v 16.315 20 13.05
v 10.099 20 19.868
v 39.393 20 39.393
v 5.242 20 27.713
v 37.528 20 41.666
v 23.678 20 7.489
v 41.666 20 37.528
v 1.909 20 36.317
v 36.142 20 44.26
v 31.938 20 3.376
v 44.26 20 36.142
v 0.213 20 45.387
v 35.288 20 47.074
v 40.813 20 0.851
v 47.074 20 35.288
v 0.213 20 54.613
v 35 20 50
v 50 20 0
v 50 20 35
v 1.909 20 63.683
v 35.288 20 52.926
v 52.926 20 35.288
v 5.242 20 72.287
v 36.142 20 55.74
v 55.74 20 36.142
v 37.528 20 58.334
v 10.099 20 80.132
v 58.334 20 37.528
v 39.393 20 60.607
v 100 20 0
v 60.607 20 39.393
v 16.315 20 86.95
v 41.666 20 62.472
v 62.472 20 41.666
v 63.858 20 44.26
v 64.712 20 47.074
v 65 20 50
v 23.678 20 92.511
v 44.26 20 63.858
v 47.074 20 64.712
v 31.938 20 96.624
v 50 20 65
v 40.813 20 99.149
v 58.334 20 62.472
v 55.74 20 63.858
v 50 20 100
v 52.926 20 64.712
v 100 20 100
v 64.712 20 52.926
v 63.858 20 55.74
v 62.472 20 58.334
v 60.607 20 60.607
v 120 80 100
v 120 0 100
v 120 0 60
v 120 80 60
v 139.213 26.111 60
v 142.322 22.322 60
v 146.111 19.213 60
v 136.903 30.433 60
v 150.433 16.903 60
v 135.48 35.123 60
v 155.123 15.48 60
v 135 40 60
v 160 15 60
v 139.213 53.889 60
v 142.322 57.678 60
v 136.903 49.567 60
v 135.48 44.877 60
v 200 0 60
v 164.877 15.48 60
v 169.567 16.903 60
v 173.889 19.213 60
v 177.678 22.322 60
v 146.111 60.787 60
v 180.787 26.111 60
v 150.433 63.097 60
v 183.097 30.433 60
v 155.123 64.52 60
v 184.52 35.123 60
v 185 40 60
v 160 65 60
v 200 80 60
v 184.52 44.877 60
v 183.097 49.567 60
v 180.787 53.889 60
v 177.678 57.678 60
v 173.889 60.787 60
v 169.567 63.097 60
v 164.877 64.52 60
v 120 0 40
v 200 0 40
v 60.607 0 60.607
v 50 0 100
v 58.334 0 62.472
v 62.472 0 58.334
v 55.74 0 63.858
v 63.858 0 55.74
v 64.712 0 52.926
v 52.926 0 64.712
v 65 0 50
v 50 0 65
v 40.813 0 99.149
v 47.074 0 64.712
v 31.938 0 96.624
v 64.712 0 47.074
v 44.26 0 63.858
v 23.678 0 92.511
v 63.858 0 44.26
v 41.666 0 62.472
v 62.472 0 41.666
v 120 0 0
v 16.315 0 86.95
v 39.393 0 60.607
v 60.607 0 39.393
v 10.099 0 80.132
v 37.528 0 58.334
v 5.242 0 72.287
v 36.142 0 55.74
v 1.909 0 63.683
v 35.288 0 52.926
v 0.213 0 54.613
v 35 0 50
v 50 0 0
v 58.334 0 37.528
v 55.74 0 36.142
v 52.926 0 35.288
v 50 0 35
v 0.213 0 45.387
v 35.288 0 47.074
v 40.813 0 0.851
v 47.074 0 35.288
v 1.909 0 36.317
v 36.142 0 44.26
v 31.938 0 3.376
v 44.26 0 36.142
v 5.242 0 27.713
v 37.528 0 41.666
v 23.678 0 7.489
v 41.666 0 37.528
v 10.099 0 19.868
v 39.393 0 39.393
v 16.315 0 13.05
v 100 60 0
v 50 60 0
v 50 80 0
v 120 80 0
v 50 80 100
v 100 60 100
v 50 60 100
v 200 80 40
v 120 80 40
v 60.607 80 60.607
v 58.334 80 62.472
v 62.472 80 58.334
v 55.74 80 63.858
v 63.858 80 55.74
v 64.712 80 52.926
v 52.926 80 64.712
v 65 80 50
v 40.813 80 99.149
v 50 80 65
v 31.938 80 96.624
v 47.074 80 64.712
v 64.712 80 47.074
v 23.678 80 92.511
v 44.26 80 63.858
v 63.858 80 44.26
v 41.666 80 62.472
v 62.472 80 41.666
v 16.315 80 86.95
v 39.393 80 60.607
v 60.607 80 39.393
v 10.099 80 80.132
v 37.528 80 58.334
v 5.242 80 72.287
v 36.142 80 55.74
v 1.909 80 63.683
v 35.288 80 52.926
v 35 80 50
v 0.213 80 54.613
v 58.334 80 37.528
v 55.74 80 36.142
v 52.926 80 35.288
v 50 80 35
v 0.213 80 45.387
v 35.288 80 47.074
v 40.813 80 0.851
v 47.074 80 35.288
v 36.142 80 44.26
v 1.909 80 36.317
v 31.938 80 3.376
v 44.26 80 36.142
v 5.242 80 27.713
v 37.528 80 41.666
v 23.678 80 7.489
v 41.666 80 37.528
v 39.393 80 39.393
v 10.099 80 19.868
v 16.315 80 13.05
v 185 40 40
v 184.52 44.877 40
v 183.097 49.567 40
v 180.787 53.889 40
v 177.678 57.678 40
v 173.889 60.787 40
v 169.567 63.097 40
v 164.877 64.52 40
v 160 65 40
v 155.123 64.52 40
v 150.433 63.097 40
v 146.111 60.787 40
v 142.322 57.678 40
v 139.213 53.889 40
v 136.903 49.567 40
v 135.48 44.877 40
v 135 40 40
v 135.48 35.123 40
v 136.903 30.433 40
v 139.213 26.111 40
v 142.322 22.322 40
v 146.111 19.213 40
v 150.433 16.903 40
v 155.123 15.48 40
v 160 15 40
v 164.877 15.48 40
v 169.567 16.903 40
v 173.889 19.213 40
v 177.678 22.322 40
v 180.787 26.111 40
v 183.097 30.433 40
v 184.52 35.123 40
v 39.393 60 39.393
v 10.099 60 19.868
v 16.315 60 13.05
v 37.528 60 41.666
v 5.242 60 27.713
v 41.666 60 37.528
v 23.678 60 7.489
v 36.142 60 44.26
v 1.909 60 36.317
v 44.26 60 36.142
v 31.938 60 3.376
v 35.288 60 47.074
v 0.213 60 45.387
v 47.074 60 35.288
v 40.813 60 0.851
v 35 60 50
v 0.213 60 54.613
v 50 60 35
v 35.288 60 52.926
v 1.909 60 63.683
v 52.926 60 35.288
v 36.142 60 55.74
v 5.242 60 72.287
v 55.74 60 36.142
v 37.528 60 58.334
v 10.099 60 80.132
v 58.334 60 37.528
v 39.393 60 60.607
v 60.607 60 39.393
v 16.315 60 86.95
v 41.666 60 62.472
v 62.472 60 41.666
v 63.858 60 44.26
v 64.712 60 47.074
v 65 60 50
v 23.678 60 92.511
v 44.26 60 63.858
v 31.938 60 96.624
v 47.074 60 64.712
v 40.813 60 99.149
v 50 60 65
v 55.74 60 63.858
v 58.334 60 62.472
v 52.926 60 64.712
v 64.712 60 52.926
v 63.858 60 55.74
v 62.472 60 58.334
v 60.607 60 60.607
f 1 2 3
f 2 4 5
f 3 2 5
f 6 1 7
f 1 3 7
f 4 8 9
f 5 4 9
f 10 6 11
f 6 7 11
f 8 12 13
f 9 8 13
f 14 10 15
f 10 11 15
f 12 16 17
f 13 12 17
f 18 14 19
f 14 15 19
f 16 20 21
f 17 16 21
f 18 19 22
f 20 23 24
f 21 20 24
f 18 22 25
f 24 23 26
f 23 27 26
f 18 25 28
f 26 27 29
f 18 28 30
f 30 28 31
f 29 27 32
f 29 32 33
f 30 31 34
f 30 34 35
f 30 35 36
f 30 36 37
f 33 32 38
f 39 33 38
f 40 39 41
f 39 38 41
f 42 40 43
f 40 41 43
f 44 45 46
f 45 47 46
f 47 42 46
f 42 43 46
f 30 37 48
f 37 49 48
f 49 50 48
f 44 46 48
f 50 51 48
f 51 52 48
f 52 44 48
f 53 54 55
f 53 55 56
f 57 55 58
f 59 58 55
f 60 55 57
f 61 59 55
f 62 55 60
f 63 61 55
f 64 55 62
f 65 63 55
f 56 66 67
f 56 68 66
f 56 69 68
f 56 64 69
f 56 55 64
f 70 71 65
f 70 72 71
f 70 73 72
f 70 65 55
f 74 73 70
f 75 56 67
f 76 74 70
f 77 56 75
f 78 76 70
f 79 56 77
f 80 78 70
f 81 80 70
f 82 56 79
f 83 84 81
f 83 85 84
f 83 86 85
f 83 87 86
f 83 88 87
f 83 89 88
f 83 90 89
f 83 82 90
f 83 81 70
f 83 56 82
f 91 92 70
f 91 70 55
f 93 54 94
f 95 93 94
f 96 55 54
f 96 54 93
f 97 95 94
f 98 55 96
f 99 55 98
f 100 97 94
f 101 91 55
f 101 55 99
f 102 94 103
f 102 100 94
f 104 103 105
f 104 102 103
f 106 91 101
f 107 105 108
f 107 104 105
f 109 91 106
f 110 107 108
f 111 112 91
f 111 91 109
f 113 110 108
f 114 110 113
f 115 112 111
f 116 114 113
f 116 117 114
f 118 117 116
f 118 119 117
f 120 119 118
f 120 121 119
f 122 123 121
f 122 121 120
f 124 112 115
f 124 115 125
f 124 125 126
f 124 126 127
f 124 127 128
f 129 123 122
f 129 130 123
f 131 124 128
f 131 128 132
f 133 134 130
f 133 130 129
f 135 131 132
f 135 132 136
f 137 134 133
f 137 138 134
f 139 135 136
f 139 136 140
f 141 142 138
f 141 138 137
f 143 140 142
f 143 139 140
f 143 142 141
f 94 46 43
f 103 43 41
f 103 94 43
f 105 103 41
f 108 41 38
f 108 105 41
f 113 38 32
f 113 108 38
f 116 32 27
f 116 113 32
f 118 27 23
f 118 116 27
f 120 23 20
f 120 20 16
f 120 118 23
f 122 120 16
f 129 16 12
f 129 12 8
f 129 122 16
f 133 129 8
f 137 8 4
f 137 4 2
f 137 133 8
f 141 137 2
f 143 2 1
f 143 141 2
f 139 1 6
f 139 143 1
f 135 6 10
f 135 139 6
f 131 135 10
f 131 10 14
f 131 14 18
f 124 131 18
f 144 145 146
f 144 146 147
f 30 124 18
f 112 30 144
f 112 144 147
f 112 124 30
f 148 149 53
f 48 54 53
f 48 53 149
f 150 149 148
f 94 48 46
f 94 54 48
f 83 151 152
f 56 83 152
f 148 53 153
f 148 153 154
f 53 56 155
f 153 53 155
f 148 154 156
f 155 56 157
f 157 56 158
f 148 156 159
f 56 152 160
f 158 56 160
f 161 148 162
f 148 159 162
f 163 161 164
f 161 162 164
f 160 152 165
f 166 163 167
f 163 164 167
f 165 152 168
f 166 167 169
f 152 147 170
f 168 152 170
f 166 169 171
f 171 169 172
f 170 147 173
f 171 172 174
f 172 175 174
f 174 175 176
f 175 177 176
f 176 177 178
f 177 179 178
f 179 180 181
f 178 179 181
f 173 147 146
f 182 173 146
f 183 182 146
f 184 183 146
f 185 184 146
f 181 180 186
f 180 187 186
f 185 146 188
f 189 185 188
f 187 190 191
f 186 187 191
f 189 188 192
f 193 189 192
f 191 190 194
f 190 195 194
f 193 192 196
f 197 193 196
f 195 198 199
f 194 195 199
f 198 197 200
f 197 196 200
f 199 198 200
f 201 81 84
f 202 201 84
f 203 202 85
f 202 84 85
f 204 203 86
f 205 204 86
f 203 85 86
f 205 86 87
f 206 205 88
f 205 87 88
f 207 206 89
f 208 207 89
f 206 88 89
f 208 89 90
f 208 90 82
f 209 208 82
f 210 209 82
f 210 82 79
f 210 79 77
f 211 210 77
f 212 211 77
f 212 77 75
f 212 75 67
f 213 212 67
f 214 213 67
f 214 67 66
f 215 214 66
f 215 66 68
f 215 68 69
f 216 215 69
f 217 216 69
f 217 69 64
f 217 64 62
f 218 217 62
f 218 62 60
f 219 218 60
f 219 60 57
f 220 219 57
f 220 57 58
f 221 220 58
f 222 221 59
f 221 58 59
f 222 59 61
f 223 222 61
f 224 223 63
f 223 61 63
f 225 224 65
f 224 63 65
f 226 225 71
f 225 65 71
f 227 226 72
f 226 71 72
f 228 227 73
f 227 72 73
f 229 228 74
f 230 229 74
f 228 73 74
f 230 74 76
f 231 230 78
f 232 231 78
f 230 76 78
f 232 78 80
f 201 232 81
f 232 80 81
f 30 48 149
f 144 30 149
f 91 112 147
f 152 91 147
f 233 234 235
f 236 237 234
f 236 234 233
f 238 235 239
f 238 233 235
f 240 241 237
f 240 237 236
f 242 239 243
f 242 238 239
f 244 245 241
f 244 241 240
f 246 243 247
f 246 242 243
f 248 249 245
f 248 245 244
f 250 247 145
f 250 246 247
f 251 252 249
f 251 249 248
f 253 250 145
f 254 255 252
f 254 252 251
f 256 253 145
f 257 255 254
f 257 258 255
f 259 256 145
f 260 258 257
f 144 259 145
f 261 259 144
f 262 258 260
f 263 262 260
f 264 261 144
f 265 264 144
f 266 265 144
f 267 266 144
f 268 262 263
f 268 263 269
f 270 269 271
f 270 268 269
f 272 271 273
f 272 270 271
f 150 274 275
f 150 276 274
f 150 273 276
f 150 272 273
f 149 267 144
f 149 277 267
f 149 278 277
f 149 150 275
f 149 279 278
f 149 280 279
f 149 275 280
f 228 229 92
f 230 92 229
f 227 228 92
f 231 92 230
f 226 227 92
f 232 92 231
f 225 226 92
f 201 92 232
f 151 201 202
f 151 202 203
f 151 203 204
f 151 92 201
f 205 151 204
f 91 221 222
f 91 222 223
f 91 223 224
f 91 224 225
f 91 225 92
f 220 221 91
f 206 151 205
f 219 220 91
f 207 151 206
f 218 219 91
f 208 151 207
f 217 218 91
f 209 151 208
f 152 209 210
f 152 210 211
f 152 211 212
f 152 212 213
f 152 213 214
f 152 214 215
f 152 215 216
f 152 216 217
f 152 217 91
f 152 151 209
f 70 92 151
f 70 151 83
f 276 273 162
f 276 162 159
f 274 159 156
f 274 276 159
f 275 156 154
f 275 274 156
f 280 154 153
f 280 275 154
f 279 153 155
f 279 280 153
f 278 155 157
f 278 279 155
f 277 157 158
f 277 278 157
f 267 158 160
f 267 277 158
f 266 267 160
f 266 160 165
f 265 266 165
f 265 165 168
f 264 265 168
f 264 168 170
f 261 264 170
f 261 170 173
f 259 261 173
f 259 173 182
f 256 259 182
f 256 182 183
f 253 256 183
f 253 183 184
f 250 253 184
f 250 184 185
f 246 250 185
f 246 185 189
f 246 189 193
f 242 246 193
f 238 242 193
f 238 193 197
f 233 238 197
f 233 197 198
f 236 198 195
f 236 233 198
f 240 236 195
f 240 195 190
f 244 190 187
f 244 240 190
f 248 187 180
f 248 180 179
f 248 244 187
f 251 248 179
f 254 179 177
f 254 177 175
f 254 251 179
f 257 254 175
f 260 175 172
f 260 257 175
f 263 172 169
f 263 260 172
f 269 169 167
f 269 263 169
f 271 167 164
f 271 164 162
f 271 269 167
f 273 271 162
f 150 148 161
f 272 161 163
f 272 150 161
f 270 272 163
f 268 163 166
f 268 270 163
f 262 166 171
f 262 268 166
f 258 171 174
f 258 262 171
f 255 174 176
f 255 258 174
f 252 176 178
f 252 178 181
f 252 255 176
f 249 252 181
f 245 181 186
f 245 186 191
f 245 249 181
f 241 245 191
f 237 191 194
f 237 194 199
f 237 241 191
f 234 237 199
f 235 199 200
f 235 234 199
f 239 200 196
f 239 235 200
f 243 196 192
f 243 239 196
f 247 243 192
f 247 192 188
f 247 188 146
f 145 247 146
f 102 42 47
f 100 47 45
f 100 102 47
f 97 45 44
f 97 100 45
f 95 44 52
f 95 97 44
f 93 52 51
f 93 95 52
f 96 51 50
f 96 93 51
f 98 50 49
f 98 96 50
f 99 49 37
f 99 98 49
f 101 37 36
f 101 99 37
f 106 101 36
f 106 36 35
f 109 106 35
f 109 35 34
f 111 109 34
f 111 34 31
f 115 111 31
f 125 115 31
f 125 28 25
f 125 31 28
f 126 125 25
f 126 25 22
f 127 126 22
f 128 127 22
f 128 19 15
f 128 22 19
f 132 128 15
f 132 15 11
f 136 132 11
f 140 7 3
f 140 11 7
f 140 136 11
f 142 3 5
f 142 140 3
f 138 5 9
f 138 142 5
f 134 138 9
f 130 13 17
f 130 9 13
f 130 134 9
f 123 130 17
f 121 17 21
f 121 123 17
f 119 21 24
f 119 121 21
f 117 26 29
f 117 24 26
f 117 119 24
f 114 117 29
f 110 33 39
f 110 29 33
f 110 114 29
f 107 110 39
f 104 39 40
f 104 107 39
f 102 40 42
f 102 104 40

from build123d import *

# Parameters (mm, degrees)
SKETCH_1_R          = 15
EXTRUDE_1_DEPTH     = 80
SKETCH_5_R          = 25
SKETCH_5_W          = 200
SKETCH_5_H          = 40
CUT_EXTRUDE_5_DEPTH = 100
SKETCH_6_W          = 100
SKETCH_6_H          = 100
CUT_EXTRUDE_7_DEPTH = 40
SKETCH_8_W          = 100
SKETCH_8_H          = 100
CUT_EXTRUDE_8_DEPTH = 40


with BuildPart() as part:
    # 草图1 → 凸台-拉伸1 (new body)
    with BuildSketch(Plane(origin=(0, 0, 0), x_dir=(1, 0, 0), z_dir=(0, 1, 0))):
        with BuildLine():
            Line((50, 0), (200, 0))
            Line((200, 0), (200, -100))
            Line((200, -100), (50, -100))
            ThreePointArc((50, -100), (0, -50), (50, 0))
        make_face()
        with Locations(Location((50, -50, 0), (0, 0, 270))):
            Circle(SKETCH_1_R, mode=Mode.SUBTRACT)
    extrude(amount=EXTRUDE_1_DEPTH)

    # 草图5 → 切除-拉伸5 (cut)
    with BuildSketch(Plane.XY.offset(100)):
        with Locations((160, 40)):
            Circle(SKETCH_5_R)
        with Locations((0, 40)):
            Rectangle(SKETCH_5_W, SKETCH_5_H)
    extrude(amount=-CUT_EXTRUDE_5_DEPTH, mode=Mode.SUBTRACT)

    # 草图6 → 切除-拉伸7 (cut)
    with BuildSketch(Plane.XY.offset(100)):
        with Locations((170, 40)):
            Rectangle(SKETCH_6_W, SKETCH_6_H)
    extrude(amount=-CUT_EXTRUDE_7_DEPTH, mode=Mode.SUBTRACT)

    # 草图8 → 切除-拉伸8 (cut)
    with BuildSketch(Plane(origin=(0, 0, 0), x_dir=(-1, 0, 0), z_dir=(0, 0, -1))):
        with Locations((-170, 40)):
            Rectangle(SKETCH_8_W, SKETCH_8_H)
    extrude(amount=-CUT_EXTRUDE_8_DEPTH, mode=Mode.SUBTRACT)


solid = part.part
